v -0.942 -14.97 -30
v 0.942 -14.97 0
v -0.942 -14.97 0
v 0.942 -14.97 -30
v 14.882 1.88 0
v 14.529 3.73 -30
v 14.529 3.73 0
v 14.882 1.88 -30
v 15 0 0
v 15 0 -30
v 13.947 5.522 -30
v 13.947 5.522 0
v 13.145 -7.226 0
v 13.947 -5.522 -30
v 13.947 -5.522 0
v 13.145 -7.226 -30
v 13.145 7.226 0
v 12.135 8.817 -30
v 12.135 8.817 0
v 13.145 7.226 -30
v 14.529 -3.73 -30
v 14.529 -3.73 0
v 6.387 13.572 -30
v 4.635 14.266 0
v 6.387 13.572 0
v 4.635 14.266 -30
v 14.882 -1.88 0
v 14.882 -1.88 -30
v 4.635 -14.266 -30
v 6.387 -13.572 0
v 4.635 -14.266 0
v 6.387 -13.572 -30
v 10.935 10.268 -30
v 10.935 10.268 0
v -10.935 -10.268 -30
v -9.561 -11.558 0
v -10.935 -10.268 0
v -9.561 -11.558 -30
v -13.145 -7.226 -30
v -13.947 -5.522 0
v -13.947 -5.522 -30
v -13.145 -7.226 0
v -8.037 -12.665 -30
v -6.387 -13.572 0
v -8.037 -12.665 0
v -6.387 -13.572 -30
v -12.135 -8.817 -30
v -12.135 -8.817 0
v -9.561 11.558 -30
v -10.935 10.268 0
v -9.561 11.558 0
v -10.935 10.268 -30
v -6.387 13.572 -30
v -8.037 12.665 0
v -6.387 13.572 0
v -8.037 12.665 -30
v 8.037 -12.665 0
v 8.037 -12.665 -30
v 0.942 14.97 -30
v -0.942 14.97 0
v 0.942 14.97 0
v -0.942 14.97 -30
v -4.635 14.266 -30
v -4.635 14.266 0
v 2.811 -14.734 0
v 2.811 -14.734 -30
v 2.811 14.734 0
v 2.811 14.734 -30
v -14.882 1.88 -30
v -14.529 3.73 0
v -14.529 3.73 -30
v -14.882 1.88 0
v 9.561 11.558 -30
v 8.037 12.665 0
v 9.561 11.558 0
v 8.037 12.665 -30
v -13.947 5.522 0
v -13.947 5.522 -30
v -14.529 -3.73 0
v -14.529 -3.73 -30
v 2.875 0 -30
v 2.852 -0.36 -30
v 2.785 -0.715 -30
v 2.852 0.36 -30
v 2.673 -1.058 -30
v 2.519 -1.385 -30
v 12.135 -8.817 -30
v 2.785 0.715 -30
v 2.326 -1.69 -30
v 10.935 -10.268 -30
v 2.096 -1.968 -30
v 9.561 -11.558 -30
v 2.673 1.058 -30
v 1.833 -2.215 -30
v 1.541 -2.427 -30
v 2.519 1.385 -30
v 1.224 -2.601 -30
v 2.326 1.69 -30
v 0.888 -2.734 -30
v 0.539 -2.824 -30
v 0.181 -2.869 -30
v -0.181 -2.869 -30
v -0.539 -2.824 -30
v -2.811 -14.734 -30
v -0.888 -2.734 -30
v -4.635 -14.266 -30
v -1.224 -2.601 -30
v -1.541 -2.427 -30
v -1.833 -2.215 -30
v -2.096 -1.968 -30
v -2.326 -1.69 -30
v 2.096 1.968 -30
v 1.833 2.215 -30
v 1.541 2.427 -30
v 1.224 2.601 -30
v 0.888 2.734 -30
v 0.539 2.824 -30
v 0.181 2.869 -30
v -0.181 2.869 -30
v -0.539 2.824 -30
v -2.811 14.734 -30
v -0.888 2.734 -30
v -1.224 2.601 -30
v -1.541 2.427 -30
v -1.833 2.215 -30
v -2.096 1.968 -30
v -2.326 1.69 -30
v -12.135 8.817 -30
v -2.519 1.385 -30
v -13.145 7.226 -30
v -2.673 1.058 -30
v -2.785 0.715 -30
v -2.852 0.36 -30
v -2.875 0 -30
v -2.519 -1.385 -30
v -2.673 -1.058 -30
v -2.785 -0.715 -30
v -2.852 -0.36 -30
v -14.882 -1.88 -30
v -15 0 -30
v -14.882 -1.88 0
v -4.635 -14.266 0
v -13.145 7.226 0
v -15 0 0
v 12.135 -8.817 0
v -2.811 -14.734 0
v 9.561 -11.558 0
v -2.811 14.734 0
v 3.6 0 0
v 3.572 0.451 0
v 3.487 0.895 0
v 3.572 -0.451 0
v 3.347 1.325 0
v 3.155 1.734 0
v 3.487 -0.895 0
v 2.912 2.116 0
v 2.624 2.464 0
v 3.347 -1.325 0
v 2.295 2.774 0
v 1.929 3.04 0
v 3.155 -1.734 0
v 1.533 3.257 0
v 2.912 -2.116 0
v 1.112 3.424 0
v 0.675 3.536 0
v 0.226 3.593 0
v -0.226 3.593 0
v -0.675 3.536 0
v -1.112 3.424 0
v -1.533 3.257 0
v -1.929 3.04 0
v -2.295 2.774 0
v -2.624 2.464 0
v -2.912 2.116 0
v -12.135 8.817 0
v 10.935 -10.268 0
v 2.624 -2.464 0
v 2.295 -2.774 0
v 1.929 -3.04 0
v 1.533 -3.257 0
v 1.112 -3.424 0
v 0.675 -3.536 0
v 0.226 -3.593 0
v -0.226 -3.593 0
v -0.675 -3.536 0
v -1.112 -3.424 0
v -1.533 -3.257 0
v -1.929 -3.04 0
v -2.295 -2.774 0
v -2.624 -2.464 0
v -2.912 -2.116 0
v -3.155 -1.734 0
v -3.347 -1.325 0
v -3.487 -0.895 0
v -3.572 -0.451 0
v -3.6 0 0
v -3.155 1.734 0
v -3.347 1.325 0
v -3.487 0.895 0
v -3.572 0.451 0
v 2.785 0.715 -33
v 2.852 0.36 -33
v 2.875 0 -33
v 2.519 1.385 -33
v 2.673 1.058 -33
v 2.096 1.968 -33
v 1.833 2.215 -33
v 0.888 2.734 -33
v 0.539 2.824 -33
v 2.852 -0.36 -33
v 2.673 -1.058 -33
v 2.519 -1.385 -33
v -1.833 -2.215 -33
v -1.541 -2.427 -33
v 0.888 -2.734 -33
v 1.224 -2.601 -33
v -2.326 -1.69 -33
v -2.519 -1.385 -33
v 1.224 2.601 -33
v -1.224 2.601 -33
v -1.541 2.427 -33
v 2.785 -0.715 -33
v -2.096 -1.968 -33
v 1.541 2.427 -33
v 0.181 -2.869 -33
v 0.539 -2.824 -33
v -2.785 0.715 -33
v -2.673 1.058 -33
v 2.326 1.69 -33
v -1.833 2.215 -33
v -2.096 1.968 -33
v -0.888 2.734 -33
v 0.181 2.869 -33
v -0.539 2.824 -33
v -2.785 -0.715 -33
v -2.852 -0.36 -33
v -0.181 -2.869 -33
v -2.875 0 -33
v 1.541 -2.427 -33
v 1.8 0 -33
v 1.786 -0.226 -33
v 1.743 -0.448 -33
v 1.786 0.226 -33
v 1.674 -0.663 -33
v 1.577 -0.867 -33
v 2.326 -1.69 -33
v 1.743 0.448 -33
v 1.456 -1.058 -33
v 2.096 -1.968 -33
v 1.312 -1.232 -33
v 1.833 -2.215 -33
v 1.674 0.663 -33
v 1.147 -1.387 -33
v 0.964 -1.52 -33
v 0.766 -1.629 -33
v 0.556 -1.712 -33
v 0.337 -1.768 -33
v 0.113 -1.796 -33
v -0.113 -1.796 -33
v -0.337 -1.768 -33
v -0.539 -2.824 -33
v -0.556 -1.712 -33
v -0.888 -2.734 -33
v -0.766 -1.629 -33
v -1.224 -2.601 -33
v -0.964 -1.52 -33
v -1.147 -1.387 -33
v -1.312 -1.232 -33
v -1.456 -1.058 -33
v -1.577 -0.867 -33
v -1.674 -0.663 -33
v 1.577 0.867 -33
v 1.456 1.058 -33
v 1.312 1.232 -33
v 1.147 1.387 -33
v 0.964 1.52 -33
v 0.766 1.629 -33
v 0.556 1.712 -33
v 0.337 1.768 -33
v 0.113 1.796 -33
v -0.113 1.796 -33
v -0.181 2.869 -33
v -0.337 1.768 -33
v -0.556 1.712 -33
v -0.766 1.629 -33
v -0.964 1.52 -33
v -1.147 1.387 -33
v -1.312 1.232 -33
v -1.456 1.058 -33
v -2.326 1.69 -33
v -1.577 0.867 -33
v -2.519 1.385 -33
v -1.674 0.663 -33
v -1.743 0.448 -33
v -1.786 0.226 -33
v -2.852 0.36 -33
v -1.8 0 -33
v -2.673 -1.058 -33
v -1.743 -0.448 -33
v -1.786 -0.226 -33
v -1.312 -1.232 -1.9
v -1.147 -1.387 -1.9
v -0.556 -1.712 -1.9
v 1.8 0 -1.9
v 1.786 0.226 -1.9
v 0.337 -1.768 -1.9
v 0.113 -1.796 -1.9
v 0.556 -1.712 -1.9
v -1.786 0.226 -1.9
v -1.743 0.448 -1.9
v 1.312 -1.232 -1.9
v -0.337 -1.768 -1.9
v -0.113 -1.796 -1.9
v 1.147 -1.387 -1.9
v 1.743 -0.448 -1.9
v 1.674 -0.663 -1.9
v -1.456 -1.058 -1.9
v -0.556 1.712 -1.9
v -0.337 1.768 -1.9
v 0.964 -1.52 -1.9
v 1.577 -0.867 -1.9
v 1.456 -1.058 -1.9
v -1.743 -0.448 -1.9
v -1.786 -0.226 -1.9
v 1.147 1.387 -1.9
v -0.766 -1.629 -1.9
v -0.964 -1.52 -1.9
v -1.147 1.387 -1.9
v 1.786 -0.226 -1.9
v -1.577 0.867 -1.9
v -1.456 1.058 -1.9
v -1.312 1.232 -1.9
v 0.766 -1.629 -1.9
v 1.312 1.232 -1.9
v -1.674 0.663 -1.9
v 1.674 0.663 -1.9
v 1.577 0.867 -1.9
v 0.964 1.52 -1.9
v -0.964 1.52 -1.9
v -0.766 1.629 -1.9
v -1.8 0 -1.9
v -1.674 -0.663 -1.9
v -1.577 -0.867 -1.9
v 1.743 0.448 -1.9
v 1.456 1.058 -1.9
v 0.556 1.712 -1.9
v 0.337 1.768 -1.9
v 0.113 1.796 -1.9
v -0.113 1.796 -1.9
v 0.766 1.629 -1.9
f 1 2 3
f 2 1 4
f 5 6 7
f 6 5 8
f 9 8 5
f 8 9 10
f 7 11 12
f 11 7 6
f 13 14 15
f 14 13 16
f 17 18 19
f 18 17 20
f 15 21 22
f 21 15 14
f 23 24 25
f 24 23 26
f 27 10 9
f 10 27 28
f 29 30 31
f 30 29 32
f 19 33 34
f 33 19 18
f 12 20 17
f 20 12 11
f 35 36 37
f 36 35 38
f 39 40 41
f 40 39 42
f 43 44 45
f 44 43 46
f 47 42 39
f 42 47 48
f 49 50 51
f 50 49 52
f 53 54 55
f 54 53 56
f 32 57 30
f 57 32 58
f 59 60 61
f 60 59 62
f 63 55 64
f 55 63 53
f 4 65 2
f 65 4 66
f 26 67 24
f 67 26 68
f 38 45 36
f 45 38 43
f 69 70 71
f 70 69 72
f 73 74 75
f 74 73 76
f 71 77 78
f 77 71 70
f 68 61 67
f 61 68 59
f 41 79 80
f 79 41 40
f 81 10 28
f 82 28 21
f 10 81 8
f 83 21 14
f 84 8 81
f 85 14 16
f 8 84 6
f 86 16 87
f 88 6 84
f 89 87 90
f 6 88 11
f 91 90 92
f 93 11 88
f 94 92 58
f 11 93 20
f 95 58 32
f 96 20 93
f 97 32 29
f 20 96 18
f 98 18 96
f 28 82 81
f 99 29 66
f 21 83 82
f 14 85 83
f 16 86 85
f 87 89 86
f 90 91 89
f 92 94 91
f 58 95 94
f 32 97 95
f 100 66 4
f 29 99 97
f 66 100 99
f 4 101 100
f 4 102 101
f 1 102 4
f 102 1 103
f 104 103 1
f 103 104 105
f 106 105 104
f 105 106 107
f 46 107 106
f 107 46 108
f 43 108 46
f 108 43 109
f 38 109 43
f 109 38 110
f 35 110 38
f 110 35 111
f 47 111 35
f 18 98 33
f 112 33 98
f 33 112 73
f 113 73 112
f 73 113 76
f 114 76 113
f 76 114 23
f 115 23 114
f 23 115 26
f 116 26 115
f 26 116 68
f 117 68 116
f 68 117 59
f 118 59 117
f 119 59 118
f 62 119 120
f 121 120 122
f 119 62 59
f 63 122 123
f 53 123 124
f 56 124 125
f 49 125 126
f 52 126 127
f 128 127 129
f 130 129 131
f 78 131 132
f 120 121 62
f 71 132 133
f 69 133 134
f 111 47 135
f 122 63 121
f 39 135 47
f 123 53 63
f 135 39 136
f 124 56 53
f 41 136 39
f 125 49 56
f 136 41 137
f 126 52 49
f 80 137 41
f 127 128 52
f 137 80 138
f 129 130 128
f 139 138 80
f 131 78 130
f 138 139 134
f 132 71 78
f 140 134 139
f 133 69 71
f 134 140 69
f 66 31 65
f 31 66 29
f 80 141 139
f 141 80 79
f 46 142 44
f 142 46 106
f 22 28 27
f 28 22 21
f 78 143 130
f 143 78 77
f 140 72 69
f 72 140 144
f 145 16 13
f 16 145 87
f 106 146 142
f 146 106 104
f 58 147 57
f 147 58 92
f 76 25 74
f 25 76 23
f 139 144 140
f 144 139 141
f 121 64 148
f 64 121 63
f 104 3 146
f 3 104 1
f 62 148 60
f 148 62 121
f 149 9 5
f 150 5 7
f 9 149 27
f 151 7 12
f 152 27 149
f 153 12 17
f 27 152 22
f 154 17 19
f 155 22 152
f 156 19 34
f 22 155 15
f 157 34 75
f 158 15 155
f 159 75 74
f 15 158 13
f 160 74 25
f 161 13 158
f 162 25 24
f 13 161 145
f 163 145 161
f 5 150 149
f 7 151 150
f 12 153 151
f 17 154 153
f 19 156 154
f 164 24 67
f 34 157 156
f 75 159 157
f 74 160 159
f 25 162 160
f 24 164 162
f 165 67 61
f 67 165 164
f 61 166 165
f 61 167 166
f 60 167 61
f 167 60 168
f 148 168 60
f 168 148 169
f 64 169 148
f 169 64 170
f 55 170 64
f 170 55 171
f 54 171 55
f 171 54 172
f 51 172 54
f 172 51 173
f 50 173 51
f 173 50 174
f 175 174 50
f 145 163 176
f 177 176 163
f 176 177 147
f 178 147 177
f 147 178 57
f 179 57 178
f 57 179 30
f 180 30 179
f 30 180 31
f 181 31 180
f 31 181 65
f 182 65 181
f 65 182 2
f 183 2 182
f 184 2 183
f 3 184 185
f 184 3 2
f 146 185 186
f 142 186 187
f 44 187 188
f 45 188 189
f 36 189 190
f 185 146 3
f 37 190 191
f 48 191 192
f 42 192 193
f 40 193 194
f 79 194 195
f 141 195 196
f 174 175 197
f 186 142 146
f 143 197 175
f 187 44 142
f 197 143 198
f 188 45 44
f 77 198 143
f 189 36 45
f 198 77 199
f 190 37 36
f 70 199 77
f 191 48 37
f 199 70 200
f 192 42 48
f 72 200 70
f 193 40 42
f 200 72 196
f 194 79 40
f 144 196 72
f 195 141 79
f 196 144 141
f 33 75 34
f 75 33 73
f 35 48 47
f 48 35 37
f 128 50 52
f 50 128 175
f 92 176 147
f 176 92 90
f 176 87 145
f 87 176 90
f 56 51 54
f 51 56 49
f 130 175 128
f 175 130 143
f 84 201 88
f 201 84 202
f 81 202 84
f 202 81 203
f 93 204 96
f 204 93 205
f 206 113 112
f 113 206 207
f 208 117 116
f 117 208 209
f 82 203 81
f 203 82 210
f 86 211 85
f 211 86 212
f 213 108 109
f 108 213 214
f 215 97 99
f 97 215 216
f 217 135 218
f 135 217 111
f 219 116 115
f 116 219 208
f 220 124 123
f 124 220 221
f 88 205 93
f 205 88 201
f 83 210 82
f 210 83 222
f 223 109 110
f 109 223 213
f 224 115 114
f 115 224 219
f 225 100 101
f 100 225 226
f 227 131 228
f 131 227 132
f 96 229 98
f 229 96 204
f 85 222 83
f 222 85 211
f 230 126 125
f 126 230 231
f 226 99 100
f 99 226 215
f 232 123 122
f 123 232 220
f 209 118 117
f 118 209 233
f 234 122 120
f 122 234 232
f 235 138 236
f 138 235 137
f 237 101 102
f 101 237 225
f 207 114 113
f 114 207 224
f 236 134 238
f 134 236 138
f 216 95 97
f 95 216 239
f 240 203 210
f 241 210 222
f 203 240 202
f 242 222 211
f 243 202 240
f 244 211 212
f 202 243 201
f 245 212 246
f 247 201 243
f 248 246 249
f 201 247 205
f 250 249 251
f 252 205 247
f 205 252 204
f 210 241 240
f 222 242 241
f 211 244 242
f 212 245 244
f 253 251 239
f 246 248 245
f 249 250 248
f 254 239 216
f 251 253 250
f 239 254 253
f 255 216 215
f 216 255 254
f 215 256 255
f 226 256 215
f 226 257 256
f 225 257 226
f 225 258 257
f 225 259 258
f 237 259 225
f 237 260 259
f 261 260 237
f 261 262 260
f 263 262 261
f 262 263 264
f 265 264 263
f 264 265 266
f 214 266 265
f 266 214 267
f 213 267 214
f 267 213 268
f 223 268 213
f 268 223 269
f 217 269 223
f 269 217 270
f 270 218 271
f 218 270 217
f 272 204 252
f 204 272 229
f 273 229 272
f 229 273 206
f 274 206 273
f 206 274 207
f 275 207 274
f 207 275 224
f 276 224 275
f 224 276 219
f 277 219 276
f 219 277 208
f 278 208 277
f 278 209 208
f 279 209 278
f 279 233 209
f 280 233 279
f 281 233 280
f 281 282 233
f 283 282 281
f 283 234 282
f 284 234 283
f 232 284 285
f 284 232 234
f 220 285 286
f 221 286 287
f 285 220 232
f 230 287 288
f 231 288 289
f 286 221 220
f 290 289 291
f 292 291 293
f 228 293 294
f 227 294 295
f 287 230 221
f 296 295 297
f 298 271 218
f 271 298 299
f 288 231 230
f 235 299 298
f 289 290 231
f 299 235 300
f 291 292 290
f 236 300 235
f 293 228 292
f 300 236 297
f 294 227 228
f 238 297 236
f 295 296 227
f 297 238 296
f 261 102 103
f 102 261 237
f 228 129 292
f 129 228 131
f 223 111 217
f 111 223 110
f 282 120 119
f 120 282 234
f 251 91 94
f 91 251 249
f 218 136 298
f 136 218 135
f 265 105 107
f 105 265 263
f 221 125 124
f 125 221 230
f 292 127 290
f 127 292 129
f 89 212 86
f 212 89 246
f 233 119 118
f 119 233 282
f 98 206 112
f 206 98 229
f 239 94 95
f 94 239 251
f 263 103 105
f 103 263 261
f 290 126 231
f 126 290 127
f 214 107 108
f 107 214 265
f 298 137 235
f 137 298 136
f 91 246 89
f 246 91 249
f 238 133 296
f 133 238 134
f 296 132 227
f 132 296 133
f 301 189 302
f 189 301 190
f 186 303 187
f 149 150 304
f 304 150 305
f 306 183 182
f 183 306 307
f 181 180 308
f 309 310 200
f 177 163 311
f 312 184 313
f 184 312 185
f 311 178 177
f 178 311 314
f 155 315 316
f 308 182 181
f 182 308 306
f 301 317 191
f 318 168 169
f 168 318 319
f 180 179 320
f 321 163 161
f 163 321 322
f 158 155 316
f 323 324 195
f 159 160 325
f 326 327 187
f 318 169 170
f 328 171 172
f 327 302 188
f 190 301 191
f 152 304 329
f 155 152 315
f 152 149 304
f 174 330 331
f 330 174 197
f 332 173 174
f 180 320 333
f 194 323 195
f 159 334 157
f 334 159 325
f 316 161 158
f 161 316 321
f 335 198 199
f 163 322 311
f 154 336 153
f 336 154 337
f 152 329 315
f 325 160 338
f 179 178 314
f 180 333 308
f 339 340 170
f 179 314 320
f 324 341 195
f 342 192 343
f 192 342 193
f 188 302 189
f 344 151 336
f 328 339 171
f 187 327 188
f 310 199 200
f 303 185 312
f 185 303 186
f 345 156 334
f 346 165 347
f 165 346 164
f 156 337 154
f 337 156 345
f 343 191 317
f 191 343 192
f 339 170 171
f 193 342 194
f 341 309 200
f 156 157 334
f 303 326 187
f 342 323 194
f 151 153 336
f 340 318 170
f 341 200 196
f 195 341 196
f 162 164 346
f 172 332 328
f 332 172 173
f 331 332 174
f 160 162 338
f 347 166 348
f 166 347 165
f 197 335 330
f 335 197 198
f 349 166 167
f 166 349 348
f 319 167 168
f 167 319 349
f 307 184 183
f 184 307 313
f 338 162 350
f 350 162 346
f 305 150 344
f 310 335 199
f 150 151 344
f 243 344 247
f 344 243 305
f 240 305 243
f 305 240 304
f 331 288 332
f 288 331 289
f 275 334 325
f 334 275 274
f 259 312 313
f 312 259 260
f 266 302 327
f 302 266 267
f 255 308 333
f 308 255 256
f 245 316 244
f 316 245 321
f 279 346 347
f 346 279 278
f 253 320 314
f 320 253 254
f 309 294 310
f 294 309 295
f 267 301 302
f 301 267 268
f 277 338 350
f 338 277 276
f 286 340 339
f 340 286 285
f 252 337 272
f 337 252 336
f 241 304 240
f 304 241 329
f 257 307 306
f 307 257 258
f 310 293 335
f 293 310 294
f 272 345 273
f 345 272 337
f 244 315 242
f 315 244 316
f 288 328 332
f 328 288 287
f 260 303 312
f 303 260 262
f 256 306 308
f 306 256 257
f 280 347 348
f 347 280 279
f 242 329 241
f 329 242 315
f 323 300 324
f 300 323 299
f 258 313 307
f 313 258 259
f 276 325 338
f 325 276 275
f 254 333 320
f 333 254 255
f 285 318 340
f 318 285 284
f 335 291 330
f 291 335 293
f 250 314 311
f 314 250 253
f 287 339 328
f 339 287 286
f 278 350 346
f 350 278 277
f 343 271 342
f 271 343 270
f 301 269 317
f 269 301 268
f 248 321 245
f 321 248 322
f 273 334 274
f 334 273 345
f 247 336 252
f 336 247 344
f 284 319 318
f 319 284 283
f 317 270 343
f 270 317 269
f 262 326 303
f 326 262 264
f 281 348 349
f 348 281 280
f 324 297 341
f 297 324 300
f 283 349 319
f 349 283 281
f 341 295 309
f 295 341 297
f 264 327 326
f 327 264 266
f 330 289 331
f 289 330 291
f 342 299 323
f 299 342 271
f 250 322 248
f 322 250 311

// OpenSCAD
$fn = 50;

difference() {
	union() {
		translate(v = [0, 0, -30.0]) {
			cylinder(h = 30, r = 15.0);
		}
		#translate(v = [0, 0, -33.0]) {
			cylinder(h = 33, r = 2.875);
		}
	}
	union() {
		translate(v = [0, 0, 0]) {
			rotate(a = [0, 0, 0]) {
				difference() {
					union() {
						translate(v = [0, 0, -33.0]) {
							cylinder(h = 33, r = 1.5);
						}
						translate(v = [0, 0, -1.9]) {
							cylinder(h = 1.9, r1 = 1.8, r2 = 3.6);
						}
						translate(v = [0, 0, -33.0]) {
							cylinder(h = 33, r = 1.8);
						}
						translate(v = [0, 0, -33.0]) {
							cylinder(h = 33, r = 1.5);
						}
					}
					union();
				}
			}
		}
	}
}
